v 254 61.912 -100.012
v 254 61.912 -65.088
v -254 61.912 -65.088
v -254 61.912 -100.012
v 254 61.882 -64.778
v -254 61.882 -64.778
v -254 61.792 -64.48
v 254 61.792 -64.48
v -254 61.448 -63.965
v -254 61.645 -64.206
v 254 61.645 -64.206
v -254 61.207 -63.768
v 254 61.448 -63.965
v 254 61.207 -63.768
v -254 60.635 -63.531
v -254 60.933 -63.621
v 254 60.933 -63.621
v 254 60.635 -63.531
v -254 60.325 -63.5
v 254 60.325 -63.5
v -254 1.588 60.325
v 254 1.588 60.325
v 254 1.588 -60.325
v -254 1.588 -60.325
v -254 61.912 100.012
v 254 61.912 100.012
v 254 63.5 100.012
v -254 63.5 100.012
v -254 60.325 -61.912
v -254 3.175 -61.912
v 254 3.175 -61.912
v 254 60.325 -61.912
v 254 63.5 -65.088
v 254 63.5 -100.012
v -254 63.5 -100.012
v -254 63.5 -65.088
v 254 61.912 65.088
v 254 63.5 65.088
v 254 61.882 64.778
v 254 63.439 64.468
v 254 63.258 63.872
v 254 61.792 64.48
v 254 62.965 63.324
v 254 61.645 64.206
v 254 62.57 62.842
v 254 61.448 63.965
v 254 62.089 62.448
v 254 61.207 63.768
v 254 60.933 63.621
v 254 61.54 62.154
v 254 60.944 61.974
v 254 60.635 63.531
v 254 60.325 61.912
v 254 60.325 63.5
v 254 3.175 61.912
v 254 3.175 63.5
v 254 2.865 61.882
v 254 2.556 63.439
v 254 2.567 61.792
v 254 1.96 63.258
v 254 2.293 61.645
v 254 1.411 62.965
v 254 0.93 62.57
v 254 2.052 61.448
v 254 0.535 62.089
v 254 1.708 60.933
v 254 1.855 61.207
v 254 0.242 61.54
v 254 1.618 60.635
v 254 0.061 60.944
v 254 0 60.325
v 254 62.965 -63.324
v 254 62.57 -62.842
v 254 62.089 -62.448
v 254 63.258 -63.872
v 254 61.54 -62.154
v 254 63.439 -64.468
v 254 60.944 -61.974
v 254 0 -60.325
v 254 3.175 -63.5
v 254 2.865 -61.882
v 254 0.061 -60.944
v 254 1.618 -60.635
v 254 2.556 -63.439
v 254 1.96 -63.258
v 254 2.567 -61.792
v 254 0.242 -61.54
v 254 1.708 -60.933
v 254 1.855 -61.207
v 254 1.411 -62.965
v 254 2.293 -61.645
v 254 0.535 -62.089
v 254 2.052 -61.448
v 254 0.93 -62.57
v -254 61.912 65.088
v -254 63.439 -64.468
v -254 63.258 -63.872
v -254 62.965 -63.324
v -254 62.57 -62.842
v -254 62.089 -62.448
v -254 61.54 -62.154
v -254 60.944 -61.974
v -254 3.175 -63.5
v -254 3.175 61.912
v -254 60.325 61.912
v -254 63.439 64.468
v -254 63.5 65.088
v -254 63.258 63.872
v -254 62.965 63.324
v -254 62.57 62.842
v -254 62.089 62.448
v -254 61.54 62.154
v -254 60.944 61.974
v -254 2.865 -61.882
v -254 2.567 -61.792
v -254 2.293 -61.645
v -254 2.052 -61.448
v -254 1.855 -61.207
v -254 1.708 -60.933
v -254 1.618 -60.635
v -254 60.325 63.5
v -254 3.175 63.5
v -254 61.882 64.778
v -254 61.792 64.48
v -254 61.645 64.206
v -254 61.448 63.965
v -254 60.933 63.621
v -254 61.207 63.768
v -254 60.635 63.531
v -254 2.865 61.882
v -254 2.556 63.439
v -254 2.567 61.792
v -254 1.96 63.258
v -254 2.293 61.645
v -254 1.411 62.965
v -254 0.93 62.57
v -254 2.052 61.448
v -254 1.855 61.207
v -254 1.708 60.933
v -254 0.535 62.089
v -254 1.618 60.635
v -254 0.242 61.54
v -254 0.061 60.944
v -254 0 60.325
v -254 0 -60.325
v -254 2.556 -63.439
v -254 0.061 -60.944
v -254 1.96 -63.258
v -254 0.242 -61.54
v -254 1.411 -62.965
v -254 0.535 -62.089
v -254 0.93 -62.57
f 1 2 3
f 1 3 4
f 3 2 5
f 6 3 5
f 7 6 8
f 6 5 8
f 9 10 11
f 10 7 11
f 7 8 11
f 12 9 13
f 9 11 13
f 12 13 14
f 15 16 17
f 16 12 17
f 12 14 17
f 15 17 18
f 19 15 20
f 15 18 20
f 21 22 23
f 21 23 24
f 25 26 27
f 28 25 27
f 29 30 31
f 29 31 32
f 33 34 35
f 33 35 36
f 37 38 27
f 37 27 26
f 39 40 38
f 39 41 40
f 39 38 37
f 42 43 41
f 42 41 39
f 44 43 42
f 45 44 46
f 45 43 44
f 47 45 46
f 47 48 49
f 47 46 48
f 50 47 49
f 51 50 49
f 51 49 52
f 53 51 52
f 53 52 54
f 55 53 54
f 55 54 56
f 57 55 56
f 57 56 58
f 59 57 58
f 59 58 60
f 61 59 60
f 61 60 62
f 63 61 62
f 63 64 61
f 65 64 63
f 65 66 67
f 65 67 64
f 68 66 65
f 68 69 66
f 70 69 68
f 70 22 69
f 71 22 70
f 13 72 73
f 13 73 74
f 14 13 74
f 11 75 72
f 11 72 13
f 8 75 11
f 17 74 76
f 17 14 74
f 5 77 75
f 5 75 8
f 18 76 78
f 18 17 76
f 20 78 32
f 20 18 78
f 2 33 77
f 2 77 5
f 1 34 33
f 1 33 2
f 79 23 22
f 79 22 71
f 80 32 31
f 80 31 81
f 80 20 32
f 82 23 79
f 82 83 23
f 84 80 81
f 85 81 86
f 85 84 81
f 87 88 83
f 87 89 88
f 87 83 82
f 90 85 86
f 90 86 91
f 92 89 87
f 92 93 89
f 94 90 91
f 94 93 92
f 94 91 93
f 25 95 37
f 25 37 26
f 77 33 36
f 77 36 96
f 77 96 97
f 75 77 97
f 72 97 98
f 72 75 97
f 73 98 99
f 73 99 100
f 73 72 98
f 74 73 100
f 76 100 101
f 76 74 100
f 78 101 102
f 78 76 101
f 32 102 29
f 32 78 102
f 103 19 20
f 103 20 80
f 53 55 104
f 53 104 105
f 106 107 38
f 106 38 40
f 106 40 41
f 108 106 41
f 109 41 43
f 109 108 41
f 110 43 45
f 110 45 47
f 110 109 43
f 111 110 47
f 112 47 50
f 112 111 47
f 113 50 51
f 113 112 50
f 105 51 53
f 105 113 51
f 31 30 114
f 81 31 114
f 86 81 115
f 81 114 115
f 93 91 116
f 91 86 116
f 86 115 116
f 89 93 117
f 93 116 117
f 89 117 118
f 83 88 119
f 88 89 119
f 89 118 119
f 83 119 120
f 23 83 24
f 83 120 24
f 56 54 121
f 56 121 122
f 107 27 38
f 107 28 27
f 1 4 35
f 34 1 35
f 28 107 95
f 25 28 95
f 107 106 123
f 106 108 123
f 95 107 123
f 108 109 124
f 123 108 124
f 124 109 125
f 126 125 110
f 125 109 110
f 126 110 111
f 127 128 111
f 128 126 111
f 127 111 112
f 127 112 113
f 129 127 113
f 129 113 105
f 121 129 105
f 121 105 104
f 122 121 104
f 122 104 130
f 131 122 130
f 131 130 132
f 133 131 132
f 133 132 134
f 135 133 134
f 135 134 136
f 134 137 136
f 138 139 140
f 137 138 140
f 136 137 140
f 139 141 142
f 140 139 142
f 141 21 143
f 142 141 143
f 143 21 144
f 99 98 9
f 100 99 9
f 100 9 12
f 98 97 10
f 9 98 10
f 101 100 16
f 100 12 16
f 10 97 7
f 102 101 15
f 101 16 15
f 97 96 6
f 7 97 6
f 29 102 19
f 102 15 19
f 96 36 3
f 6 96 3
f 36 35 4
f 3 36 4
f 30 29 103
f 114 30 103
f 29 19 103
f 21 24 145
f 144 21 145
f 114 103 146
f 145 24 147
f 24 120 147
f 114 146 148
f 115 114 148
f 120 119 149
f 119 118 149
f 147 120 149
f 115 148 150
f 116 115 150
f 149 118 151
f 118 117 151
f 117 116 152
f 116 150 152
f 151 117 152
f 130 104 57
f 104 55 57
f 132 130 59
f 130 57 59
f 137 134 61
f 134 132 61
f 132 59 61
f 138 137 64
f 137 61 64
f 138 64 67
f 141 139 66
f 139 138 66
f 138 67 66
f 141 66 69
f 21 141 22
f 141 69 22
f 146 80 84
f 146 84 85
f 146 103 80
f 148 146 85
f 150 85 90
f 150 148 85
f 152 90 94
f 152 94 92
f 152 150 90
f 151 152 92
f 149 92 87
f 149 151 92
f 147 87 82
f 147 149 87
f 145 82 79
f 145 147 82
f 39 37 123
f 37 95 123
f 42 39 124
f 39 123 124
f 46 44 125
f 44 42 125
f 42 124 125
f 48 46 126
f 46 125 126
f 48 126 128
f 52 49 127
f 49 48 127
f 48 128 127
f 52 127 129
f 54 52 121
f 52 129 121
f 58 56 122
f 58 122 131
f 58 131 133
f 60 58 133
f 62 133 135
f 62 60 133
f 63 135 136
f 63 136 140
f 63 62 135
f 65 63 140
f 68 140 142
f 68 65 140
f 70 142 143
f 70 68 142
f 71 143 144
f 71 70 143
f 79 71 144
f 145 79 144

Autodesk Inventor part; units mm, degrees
ref_plane "YZ Plane" through (0, 0, 0) normal (1, 0, 0) x (0, 1, 0)
ref_plane "XZ Plane" through (0, 0, 0) normal (0, 1, 0) x (-1, 0, 0)
ref_plane "XY Plane" through (0, 0, 0) normal (0, 0, 1) x (1, 0, 0)
sketch "Sketch1" plane through (0, 0, 0) normal (0, 1, 0) x (-1, 0, 0)
  line L0 (254, 63.5) -> (-254, 63.5)
  line L1 (-254, 63.5) -> (-254, -63.5)
  line L2 (-254, -63.5) -> (254, -63.5)
  line L3 (254, -63.5) -> (254, 63.5)
  line L4 (254, 63.5) -> (-254, -63.5) construction
  line L5 (-254, 63.5) -> (254, -63.5) construction
  point P0 (0, 0)
  dimension "d0" = 508
  dimension "d1" = 127
extrude "Extrusion1" add sketch "Sketch1" along normal blind 1.5875
sketch "Sketch2" plane through (254, 0, 61.9125) normal (0, 0, 1) x (1, 0, 0)
  line L0 (-508, 0) -> (0, 0)
  line L1 (0, 0) -> (0, 63.5)
  line L2 (0, 63.5) -> (-508, 63.5)
  line L3 (-508, 63.5) -> (-508, 0)
edge flange "Flange1" height 63.5 angle 90 thickness 1.5875 bend radius 1.5875 thickness toward (0, 0, 1) relief straight relief width 1.5875 relief depth 0.7937 edges at (0, 1.5875, 63.5) wall of the first edge with corners at (-254, 0, 61.9125) (254, 0, 61.9125) (254, 63.5, 61.9125) (-254, 63.5, 61.9125)
bend "Bend1"
corner "Corner1"
sketch "Sketch3" plane through (-254, 61.9125, 61.9125) normal (0, 1, 0) x (-1, 0, 0)
  line L0 (-508, 0) -> (0, 0)
  line L1 (0, 0) -> (0, 38.1)
  line L2 (0, 38.1) -> (-508, 38.1)
  line L3 (-508, 38.1) -> (-508, 0)
edge flange "Flange2" height 38.1 angle 90 thickness 1.5875 bend radius 1.5875 thickness toward (0, 1, 0) relief straight relief width 1.5875 relief depth 0.7937 edges at (0, 63.5, 63.5) wall of the first edge with corners at (254, 61.9125, 61.9125) (-254, 61.9125, 61.9125) (-254, 61.9125, 100.0125) (254, 61.9125, 100.0125)
bend "Bend2"
corner "Corner2"
sketch "Sketch4" plane through (-254, 0, -61.9125) normal (0, 0, -1) x (-1, 0, 0)
  line L0 (-508, 0) -> (0, 0)
  line L1 (0, 0) -> (0, 63.5)
  line L2 (0, 63.5) -> (-508, 63.5)
  line L3 (-508, 63.5) -> (-508, 0)
edge flange "Flange3" height 63.5 angle 90 thickness 1.5875 bend radius 1.5875 thickness toward (0, 0, -1) relief straight relief width 1.5875 relief depth 0.7937 edges at (0, 1.5875, -63.5) wall of the first edge with corners at (254, 0, -61.9125) (-254, 0, -61.9125) (-254, 63.5, -61.9125) (254, 63.5, -61.9125)
bend "Bend3"
corner "Corner3"
sketch "Sketch5" plane through (254, 61.9125, -61.9125) normal (0, 1, 0) x (-1, 0, 0)
  line L0 (508, 0) -> (0, 0)
  line L1 (0, 0) -> (0, -38.1)
  line L2 (0, -38.1) -> (508, -38.1)
  line L3 (508, -38.1) -> (508, 0)
edge flange "Flange4" height 38.1 angle 90 thickness 1.5875 bend radius 1.5875 thickness toward (0, 1, 0) relief straight relief width 1.5875 relief depth 0.7937 edges at (0, 63.5, -63.5) wall of the first edge with corners at (-254, 61.9125, -61.9125) (254, 61.9125, -61.9125) (254, 61.9125, -100.0125) (-254, 61.9125, -100.0125)
bend "Bend4"
corner "Corner4"
equation "\"d4\" = Thickness"
equation "\"d5\" = BendReliefWidth"
equation "\"d6\" = BendReliefDepth"
equation "\"d7\" = MinimumRemnant"
equation "\"d8\" = TransitionRadius"
equation "\"d11\" = BendRadius"
equation "\"d12\" = CornerReliefSize"
equation "\"d13\" = GapSize"
equation "\"d14\" = JacobiRadiusSize"
equation "\"d15\" = BendReliefWidth"
equation "\"d16\" = BendReliefDepth"
equation "\"d17\" = MinimumRemnant"
equation "\"d18\" = TransitionRadius"
equation "\"d21\" = BendRadius"
equation "\"d22\" = CornerReliefSize"
equation "\"d23\" = GapSize"
equation "\"d24\" = JacobiRadiusSize"
equation "\"d25\" = BendReliefWidth"
equation "\"d26\" = BendReliefDepth"
equation "\"d27\" = MinimumRemnant"
equation "\"d28\" = TransitionRadius"
equation "\"d31\" = BendRadius"
equation "\"d32\" = CornerReliefSize"
equation "\"d33\" = GapSize"
equation "\"d34\" = JacobiRadiusSize"
equation "\"d35\" = BendReliefWidth"
equation "\"d36\" = BendReliefDepth"
equation "\"d37\" = MinimumRemnant"
equation "\"d38\" = TransitionRadius"
equation "\"d41\" = BendRadius"
equation "\"d42\" = CornerReliefSize"
equation "\"d43\" = GapSize"
equation "\"d44\" = JacobiRadiusSize"
equation "\"BendRadius\" = Thickness"
equation "\"BendReliefWidth\" = Thickness"
equation "\"BendReliefDepth\" = 0.5 * Thickness"
equation "\"CornerReliefSize\" = 4 * Thickness"
equation "\"MinimumRemnant\" = 2 * Thickness"
equation "\"TransitionRadius\" = BendRadius"
equation "\"JacobiRadiusSize\" = Thickness"
equation "\"GapSize\" = Thickness"
equation "\"Thickness\" = 1.5875"
properties part number "Cubby Sheet Metal" material "Steel, Mild"
